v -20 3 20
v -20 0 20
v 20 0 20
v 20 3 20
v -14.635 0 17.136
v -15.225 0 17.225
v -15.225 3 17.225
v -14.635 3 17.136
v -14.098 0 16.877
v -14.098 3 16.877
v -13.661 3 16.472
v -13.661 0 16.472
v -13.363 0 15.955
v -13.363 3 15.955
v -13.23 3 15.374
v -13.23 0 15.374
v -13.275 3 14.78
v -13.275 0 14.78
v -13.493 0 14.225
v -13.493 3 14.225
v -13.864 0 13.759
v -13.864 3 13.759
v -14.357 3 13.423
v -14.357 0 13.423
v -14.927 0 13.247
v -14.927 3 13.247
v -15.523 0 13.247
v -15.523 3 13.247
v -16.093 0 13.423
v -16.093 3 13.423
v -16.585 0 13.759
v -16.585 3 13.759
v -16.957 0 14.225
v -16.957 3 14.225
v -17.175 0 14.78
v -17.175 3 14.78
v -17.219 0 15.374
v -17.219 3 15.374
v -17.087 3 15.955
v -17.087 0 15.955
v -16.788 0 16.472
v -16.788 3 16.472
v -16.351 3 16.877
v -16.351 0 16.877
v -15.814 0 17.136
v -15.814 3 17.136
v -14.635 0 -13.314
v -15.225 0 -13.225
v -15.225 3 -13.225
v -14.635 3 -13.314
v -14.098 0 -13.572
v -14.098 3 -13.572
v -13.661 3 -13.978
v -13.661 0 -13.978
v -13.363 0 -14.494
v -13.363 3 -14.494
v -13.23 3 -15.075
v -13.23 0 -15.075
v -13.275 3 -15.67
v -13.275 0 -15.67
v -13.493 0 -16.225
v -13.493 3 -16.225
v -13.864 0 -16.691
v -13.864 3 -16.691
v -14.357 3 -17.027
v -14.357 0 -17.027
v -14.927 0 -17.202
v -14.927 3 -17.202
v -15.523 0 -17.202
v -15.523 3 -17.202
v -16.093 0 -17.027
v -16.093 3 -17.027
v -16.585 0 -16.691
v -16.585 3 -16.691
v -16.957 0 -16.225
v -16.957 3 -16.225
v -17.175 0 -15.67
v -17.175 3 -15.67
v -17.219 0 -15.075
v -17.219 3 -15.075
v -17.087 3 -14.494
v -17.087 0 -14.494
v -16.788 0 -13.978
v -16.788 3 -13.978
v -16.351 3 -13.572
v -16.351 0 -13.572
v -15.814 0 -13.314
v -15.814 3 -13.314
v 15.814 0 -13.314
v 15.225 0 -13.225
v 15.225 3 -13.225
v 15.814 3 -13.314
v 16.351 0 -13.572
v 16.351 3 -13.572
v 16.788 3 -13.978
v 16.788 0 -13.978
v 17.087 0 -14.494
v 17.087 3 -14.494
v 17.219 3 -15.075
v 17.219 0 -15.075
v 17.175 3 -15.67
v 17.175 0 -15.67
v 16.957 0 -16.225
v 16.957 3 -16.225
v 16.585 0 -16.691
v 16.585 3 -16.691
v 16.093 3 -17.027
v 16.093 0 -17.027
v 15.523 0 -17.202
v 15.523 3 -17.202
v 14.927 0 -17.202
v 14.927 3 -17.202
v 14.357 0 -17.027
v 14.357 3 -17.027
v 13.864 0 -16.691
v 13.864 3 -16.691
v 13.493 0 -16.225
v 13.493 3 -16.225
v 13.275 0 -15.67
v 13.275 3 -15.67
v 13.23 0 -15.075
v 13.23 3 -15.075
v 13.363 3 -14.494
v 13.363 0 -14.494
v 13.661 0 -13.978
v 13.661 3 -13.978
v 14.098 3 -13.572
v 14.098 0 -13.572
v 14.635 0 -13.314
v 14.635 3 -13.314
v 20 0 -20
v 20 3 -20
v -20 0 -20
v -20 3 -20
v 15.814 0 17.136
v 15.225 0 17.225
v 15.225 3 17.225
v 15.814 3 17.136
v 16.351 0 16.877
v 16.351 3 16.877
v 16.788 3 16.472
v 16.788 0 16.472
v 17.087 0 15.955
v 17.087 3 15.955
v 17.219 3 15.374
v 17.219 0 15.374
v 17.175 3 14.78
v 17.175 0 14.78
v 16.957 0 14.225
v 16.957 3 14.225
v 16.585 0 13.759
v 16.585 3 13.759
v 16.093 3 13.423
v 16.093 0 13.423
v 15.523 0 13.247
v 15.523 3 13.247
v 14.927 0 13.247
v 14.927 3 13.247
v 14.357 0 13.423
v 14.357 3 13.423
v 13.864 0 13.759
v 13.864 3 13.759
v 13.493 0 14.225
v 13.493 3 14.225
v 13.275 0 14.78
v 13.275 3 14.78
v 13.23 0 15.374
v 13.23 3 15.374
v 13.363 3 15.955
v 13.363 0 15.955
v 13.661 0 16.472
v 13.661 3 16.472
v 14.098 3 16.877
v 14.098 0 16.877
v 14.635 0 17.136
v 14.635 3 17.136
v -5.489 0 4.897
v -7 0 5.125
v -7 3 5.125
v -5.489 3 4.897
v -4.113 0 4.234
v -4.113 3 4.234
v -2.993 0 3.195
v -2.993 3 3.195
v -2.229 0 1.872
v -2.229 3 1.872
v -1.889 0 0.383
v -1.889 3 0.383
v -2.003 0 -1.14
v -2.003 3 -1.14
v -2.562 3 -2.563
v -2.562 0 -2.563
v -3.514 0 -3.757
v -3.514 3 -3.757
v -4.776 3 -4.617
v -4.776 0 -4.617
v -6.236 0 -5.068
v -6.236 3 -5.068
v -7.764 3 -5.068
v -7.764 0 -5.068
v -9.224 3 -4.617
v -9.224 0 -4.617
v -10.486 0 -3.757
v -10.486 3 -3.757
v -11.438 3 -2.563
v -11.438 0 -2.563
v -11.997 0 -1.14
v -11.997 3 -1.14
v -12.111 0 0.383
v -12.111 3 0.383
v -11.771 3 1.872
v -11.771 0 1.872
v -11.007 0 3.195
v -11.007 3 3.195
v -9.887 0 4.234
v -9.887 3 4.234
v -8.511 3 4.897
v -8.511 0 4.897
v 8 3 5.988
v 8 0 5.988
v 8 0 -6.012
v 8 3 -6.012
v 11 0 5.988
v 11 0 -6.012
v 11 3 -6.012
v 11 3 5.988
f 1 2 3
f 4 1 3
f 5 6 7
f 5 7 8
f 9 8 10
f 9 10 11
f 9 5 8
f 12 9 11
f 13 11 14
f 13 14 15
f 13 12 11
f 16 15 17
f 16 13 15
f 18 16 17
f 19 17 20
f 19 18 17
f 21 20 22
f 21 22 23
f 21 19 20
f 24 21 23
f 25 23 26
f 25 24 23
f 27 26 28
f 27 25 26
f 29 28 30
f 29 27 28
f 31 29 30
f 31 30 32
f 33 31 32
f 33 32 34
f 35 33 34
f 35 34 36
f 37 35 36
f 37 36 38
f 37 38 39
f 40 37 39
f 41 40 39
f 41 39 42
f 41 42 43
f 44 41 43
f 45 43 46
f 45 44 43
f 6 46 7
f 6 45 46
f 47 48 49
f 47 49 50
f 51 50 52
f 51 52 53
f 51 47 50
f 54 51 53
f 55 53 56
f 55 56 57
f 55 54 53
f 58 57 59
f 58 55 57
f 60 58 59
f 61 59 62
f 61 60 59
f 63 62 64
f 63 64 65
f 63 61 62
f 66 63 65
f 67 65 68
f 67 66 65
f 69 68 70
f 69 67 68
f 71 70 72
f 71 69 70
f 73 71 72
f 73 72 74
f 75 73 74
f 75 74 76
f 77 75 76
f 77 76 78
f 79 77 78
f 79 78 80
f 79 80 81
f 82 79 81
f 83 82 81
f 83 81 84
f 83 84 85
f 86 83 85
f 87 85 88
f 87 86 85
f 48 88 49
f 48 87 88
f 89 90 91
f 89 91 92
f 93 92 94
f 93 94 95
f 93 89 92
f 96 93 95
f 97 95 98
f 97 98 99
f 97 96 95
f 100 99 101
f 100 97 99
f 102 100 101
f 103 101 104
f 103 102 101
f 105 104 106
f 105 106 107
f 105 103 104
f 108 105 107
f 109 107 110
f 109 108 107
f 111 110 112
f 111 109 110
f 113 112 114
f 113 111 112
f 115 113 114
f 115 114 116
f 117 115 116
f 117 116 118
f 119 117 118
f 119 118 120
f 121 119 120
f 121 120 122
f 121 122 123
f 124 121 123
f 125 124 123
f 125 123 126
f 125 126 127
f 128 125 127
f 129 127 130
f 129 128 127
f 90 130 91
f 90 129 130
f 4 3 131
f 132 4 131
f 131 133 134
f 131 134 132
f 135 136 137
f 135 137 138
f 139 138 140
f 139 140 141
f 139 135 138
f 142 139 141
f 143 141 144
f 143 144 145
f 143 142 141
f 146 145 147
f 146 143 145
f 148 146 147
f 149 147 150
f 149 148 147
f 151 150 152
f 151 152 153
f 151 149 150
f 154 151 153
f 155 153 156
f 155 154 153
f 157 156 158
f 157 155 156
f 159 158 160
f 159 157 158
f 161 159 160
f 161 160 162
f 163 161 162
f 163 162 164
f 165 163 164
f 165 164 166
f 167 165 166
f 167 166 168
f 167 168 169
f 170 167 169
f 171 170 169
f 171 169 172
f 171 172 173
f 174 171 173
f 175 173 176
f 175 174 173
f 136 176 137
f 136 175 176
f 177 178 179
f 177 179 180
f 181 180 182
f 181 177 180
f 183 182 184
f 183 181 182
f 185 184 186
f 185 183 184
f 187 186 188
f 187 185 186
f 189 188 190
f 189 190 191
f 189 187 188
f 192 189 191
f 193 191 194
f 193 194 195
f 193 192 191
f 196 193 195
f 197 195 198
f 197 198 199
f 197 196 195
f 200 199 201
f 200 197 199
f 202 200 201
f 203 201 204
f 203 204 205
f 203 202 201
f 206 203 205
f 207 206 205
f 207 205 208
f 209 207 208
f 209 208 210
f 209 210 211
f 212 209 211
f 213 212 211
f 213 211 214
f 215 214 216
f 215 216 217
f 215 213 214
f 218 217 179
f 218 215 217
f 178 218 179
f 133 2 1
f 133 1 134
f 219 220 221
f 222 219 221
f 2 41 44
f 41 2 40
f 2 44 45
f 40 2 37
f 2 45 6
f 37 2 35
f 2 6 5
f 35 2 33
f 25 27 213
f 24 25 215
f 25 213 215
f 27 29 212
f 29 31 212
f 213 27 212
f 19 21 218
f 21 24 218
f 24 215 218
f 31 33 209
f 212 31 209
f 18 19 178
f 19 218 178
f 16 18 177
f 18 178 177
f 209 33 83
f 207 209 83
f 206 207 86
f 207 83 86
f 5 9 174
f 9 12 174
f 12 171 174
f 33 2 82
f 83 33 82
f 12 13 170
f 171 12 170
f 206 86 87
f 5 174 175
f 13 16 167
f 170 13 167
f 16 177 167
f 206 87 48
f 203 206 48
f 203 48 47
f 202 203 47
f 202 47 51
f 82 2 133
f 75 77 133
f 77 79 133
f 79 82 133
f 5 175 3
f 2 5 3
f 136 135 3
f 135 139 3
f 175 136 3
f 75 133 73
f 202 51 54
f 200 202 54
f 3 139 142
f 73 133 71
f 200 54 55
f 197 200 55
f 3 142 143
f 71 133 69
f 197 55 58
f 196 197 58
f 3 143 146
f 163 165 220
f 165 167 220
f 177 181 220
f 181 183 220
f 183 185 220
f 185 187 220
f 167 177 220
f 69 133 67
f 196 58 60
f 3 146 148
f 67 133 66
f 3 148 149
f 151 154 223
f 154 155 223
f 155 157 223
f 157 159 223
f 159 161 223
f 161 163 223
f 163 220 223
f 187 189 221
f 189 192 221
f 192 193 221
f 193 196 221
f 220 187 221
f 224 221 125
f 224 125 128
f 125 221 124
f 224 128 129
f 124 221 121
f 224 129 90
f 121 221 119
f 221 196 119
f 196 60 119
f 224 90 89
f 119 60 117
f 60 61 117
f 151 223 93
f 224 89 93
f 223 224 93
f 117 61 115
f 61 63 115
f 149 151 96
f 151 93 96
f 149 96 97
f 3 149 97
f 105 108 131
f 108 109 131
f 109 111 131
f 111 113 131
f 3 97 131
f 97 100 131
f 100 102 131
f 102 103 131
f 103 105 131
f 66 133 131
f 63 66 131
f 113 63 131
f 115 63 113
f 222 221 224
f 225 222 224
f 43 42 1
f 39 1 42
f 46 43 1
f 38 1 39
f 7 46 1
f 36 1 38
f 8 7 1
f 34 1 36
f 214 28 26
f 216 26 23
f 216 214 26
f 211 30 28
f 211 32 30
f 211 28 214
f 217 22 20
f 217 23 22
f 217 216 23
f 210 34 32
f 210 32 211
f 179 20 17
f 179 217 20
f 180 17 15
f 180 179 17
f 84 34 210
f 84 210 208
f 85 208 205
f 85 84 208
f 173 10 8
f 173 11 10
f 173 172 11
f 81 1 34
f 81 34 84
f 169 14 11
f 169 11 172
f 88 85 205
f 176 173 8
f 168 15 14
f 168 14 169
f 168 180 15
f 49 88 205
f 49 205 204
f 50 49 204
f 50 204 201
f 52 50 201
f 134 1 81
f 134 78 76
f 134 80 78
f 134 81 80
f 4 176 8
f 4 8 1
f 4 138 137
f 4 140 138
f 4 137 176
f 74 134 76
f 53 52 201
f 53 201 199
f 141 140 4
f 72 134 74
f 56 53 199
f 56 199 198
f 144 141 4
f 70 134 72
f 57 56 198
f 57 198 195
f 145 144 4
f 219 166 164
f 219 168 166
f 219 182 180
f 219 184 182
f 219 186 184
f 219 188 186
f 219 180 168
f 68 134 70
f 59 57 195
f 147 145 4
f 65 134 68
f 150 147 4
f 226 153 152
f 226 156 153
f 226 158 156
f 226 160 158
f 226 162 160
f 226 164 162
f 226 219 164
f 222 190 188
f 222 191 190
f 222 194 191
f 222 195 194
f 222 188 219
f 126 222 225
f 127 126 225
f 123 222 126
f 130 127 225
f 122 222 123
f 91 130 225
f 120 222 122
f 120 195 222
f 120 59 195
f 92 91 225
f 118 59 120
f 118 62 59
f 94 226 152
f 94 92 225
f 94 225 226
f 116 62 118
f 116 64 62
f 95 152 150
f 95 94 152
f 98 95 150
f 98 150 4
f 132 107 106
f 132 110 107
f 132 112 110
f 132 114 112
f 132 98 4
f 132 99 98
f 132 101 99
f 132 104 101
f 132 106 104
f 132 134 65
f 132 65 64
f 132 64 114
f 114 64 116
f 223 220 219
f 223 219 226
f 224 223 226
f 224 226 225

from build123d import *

# Parameters (mm, degrees)
SKETCH_2_W          = 40
SKETCH_2_H          = 40
EXTRUDE_2_DEPTH     = 3
SKETCH_3_R          = 2
SKETCH_3_R_2        = 5.125
SKETCH_3_W          = 3
SKETCH_3_H          = 12
CUT_EXTRUDE_1_DEPTH = 3


with BuildPart() as part:
    # 草图2 → 凸台-拉伸2 (new body)
    with BuildSketch(Plane(origin=(0, 0, 0), x_dir=(1, 0, 0), z_dir=(0, 1, 0))):
        Rectangle(SKETCH_2_W, SKETCH_2_H)
    extrude(amount=EXTRUDE_2_DEPTH)

    # 草图3 → 切除-拉伸1 (cut)
    with BuildSketch(Plane(origin=(0, 0, 0), x_dir=(1, 0, 0), z_dir=(0, 1, 0))):
        with Locations(Location((-15.224798987, -15.224798987, 0), (0, 0, 270))):
            Circle(SKETCH_3_R)
        with Locations(Location((15.224798987, -15.224798987, 0), (0, 0, 270))):
            Circle(SKETCH_3_R)
        with Locations(Location((15.224798987, 15.224798987, 0), (0, 0, 270))):
            Circle(SKETCH_3_R)
        with Locations(Location((-15.224798987, 15.224798987, 0), (0, 0, 270))):
            Circle(SKETCH_3_R)
        with Locations(Location((-7, 0, 0), (0, 0, 270))):
            Circle(SKETCH_3_R_2)
        with Locations((9.5, 0.011605537)):
            Rectangle(SKETCH_3_W, SKETCH_3_H)
    extrude(amount=CUT_EXTRUDE_1_DEPTH, mode=Mode.SUBTRACT)


solid = part.part
